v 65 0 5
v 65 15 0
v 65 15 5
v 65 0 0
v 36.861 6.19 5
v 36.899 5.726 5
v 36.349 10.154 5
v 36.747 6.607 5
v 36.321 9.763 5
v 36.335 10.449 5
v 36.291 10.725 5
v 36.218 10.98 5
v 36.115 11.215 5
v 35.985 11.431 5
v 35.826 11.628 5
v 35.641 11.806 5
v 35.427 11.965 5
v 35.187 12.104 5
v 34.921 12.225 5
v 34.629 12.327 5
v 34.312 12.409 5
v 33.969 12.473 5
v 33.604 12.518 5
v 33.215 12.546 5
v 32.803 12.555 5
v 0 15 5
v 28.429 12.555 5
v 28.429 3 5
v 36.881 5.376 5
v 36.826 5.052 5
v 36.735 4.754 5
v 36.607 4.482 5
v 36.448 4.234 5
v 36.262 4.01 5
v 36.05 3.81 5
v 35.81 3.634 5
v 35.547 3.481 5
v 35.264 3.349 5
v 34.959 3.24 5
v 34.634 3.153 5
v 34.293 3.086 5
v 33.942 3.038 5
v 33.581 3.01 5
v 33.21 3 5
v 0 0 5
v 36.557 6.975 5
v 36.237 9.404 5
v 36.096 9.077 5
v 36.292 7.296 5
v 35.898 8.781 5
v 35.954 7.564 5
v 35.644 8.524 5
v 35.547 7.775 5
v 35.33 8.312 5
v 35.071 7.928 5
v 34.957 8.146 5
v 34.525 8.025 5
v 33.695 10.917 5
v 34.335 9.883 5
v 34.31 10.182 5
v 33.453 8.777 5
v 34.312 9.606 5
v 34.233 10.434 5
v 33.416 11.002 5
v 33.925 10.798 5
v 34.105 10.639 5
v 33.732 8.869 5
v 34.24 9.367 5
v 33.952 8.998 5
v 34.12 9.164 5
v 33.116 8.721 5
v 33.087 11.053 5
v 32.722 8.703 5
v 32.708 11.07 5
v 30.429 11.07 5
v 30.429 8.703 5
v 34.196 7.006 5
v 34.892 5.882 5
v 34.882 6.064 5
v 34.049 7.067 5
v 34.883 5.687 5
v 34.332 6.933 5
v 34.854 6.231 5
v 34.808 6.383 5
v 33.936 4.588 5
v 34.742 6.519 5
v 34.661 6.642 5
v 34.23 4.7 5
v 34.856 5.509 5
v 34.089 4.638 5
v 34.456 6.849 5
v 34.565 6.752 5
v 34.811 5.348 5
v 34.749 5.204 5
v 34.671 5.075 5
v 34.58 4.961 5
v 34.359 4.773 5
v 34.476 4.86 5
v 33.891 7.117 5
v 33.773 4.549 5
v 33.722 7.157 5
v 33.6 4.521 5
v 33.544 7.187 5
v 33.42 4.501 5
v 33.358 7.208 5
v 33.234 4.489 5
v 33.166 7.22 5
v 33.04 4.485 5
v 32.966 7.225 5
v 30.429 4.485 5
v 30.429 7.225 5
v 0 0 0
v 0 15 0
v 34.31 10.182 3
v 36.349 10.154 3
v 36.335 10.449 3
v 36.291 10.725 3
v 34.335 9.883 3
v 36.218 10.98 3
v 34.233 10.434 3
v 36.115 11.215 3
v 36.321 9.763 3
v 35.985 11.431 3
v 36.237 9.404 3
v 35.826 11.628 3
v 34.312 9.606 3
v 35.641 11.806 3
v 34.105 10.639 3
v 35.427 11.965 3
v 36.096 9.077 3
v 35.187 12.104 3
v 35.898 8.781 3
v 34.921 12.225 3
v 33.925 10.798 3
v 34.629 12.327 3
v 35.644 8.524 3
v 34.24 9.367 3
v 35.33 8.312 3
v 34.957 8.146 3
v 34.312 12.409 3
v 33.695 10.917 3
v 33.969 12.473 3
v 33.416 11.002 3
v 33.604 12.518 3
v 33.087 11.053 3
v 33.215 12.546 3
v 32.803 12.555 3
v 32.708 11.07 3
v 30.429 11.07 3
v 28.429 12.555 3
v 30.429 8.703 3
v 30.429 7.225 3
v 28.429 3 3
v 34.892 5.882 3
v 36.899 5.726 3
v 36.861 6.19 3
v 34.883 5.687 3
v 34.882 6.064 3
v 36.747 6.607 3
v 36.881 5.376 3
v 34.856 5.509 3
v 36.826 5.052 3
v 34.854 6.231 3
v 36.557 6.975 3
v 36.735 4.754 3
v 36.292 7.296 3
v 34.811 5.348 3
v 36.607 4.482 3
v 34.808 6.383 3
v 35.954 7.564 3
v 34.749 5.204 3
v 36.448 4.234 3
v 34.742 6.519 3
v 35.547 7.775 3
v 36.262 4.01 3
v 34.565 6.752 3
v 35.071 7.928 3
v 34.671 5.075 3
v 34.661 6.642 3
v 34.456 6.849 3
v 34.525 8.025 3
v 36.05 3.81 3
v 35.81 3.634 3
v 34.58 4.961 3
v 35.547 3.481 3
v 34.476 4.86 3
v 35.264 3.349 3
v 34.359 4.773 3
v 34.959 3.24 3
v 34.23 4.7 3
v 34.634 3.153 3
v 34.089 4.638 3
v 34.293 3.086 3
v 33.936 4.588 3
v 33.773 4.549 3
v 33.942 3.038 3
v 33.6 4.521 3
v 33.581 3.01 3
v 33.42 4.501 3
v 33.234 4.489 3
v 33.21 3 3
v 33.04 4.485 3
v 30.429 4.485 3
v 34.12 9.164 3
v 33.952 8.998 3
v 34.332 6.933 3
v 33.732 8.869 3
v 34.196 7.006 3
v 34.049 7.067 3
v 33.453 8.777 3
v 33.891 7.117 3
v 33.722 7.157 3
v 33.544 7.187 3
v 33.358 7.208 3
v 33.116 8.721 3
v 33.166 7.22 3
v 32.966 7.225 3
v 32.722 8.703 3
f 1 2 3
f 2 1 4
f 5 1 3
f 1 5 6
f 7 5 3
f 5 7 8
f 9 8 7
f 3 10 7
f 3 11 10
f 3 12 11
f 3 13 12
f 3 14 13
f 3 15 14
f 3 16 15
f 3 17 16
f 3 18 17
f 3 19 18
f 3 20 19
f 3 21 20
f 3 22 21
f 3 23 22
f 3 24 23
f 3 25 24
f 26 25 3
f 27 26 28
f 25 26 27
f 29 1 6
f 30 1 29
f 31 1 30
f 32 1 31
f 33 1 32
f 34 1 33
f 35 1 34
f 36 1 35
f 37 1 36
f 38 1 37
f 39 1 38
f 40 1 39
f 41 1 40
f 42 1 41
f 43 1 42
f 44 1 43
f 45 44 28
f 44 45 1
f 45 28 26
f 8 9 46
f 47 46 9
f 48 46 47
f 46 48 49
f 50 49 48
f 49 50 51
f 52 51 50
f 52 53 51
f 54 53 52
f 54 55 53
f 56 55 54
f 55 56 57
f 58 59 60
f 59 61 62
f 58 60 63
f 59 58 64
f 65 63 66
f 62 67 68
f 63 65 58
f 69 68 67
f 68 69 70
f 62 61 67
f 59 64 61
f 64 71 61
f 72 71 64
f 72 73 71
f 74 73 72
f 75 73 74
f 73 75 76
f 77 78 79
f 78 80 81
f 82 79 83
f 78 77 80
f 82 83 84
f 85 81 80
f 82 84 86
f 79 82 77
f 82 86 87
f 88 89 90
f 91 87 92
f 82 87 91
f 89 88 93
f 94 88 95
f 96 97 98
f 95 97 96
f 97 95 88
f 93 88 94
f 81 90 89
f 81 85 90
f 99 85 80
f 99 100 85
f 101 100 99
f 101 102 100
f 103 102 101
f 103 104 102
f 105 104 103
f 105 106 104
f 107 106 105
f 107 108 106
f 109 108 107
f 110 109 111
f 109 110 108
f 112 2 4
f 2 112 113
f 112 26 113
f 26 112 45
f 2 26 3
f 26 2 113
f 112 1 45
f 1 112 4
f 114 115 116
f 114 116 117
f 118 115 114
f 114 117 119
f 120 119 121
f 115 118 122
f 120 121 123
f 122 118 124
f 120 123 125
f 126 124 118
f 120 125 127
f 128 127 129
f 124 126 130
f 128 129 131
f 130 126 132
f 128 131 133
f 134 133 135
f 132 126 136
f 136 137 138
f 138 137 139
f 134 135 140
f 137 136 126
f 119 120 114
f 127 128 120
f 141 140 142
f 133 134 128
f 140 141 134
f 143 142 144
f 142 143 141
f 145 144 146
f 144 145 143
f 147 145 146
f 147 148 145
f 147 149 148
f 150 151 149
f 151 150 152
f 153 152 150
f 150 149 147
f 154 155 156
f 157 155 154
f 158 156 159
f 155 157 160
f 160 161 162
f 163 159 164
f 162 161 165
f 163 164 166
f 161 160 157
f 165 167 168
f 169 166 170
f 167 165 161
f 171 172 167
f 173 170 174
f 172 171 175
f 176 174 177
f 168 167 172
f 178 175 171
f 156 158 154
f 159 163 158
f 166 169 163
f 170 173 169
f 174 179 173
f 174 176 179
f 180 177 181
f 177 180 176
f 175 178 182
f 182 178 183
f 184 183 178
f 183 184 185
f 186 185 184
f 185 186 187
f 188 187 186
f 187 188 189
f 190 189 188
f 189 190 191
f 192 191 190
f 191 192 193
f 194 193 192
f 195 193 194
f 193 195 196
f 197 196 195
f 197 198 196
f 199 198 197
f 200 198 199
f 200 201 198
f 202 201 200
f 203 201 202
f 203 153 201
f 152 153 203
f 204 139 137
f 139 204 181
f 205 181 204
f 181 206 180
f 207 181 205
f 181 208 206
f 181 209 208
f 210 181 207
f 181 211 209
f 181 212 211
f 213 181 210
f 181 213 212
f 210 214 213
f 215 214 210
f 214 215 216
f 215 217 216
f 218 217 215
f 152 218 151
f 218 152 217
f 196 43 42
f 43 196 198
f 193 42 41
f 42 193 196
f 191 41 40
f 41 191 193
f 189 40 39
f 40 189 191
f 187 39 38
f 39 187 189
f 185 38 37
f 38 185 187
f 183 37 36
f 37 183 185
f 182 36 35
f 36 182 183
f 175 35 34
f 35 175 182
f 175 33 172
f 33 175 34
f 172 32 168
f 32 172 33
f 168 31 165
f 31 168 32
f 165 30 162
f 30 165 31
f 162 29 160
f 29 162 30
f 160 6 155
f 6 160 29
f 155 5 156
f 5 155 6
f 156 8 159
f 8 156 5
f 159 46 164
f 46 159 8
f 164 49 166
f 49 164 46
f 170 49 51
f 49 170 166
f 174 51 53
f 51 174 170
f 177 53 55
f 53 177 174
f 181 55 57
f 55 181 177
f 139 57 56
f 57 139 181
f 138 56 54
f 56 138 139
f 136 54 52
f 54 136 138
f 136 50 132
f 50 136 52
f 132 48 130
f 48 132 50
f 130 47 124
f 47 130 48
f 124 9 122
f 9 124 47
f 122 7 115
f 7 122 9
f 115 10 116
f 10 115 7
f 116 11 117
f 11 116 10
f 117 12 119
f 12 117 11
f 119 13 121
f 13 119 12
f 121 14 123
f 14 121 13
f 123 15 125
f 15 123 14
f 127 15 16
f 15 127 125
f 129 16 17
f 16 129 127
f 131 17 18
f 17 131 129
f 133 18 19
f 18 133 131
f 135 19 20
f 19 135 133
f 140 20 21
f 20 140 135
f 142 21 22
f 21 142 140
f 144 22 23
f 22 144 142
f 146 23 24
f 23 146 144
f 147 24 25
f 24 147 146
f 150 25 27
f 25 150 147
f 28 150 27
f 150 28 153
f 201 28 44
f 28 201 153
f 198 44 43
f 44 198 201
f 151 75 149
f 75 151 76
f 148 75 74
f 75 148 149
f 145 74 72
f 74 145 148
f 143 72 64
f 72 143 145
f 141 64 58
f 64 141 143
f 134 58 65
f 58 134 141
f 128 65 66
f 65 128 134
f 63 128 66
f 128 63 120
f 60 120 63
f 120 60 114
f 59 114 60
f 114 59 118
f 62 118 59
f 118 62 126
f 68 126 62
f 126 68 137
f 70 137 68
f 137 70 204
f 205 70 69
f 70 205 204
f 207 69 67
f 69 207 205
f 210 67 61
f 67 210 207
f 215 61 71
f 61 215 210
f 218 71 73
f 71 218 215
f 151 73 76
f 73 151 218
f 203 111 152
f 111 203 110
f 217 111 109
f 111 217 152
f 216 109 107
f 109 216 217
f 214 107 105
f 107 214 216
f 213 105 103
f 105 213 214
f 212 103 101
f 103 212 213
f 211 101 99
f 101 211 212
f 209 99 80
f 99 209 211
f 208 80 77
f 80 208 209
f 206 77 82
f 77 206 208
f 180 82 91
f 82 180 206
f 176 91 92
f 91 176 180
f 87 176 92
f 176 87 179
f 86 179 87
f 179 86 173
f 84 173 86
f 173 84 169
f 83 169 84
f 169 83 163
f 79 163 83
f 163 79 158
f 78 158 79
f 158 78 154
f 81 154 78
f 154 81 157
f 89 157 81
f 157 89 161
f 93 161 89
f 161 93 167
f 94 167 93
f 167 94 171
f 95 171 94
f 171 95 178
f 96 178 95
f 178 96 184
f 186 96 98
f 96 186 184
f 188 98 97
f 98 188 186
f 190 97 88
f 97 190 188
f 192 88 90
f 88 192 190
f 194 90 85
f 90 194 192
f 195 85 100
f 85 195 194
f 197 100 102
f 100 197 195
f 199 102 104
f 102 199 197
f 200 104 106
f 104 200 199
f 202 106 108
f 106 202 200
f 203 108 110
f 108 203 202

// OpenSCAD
difference(){
	union(){ 
        translate([0,0,0]){
           cube([65,15,5], center=false);
        }                
	}
	union() {
        translate([60-65/2, 3,3]){
            linear_extrude(height = 10) {
                text("B", size = 10, font="Arial:style=Bold");
            }
        }                


	}
}
